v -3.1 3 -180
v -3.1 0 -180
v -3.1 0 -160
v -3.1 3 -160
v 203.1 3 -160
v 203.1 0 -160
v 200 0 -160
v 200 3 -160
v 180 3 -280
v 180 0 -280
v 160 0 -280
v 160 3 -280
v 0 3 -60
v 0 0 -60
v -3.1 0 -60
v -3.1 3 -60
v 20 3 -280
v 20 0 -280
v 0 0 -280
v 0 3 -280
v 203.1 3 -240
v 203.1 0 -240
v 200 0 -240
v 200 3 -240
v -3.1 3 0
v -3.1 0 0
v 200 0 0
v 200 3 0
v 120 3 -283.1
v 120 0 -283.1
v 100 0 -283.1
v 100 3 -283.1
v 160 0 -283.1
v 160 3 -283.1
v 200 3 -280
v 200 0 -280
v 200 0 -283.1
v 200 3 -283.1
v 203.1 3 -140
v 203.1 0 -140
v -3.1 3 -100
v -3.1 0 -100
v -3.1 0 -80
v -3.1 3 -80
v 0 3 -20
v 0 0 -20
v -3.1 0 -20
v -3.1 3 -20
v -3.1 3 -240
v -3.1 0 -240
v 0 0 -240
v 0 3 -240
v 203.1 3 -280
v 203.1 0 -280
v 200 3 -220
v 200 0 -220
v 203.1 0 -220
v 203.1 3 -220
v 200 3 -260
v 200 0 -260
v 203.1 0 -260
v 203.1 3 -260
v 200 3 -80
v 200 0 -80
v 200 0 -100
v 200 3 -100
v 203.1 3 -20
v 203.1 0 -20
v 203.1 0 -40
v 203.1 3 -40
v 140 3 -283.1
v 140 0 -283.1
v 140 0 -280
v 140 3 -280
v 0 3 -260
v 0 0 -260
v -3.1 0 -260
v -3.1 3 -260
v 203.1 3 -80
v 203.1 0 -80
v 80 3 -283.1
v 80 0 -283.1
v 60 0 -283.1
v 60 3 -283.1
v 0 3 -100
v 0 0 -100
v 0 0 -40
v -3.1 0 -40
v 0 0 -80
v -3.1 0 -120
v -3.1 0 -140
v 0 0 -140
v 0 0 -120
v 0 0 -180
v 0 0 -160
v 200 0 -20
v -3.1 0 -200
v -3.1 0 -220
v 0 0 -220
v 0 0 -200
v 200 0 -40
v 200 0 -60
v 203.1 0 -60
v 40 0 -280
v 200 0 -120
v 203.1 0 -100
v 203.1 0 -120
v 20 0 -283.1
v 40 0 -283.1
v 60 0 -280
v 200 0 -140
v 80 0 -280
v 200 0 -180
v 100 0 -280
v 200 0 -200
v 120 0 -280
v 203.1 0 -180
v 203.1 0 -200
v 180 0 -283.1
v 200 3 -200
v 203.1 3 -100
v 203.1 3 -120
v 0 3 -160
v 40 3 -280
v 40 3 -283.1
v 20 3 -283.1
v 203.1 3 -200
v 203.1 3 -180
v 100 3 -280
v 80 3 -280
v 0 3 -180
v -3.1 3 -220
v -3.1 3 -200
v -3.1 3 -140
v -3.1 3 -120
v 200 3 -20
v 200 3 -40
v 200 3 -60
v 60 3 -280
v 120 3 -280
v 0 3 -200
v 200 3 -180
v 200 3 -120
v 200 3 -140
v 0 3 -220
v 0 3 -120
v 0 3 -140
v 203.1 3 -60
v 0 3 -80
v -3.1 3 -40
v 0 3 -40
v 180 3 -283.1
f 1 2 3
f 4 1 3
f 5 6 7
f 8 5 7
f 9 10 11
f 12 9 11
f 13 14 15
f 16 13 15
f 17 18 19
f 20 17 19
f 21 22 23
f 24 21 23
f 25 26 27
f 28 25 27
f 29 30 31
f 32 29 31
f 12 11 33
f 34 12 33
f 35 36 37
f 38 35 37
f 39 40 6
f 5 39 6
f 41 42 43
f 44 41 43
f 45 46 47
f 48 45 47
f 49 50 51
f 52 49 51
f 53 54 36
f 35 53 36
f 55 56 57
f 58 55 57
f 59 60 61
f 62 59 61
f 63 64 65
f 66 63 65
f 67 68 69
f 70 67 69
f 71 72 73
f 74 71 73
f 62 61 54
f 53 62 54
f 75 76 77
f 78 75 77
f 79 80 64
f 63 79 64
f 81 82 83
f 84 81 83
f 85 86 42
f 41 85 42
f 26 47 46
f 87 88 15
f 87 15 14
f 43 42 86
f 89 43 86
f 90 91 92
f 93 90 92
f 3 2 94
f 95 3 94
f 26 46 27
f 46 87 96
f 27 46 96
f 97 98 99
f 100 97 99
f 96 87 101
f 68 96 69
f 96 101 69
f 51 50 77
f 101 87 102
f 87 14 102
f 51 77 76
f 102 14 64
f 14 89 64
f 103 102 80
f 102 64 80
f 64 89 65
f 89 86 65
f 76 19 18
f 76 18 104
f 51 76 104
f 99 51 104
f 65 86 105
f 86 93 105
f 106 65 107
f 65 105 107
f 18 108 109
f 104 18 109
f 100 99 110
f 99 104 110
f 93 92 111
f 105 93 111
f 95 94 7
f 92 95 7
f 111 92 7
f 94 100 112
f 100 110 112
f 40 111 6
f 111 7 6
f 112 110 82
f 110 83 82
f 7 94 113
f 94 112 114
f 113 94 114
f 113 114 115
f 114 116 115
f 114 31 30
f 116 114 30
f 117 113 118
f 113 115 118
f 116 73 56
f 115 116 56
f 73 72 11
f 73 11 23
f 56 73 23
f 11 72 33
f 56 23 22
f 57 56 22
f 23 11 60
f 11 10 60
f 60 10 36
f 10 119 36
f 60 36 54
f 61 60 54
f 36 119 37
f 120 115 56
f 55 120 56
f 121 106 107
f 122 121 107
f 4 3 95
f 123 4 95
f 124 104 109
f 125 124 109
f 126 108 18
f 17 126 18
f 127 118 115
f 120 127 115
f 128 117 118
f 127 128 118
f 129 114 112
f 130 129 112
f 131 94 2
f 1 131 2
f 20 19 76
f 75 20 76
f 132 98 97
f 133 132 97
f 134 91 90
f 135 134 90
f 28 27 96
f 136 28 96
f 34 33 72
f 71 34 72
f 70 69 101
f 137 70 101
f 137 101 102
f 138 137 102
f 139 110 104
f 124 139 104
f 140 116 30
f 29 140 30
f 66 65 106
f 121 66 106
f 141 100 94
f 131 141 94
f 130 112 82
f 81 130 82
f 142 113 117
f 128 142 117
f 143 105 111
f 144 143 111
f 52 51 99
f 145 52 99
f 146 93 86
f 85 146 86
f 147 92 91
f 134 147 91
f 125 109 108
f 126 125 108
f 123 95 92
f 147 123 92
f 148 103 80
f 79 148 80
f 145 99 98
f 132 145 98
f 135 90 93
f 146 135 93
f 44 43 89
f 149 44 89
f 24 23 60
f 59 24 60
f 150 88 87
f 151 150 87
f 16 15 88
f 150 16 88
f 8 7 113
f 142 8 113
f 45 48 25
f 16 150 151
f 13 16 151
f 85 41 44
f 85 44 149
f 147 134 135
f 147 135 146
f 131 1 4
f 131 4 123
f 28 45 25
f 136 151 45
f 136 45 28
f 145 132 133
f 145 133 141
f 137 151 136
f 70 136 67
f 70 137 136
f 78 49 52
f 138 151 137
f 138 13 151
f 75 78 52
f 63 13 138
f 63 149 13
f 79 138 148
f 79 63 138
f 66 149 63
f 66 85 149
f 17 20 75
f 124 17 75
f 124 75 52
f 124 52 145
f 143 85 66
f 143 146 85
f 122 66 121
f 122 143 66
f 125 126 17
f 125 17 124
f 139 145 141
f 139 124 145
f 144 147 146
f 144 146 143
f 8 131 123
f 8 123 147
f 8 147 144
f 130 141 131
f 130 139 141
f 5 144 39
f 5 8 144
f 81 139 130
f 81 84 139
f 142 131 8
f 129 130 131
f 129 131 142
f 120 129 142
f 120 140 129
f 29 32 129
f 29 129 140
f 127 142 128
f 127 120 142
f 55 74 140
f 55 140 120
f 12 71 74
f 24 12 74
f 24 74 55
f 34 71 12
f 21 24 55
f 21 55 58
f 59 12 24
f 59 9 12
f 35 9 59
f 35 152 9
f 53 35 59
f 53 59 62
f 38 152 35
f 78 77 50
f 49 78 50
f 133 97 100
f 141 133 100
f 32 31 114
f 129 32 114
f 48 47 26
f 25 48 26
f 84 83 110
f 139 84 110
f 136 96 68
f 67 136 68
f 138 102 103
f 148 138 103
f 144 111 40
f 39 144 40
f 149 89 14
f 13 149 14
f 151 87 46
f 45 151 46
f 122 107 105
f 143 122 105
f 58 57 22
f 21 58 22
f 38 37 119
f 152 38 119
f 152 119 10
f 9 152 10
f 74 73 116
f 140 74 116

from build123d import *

# Parameters (mm, degrees)
SALIENTE_EXTRUIR1_DEPTH = 3


with BuildPart() as part:
    # Croquis1 → Saliente-Extruir1 (new body)
    with BuildSketch(Plane(origin=(0, 0, 0), x_dir=(1, 0, 0), z_dir=(0, 1, 0))):
        Polygon((0, 0), (200, 0), (200, 20), (203.1, 20), (203.1, 40), (200, 40), (200, 60), (203.1, 60), (203.1, 80), (200, 80), (200, 100), (203.1, 100), (203.1, 120), (200, 120), (200, 140), (203.1, 140), (203.1, 160), (200, 160), (200, 180), (203.1, 180), (203.1, 200), (200, 200), (200, 220), (203.1, 220), (203.1, 240), (200, 240), (200, 260), (203.1, 260), (203.1, 280), (200, 280), (200, 283.1), (180, 283.1), (180, 280), (160, 280), (160, 283.1), (140, 283.1), (140, 280), (120, 280), (120, 283.1), (100, 283.1), (100, 280), (80, 280), (80, 283.1), (60, 283.1), (60, 280), (40, 280), (40, 283.1), (20, 283.1), (20, 280), (0, 280), (0, 260), (-3.1, 260), (-3.1, 240), (0, 240), (0, 220), (-3.1, 220), (-3.1, 200), (0, 200), (0, 180), (-3.1, 180), (-3.1, 160), (0, 160), (0, 140), (-3.1, 140), (-3.1, 120), (0, 120), (0, 100), (-3.1, 100), (-3.1, 80), (0, 80), (0, 60), (-3.1, 60), (-3.1, 40), (0, 40), (0, 20), (-3.1, 20), (-3.1, 0), align=None)
    extrude(amount=SALIENTE_EXTRUIR1_DEPTH)


solid = part.part
